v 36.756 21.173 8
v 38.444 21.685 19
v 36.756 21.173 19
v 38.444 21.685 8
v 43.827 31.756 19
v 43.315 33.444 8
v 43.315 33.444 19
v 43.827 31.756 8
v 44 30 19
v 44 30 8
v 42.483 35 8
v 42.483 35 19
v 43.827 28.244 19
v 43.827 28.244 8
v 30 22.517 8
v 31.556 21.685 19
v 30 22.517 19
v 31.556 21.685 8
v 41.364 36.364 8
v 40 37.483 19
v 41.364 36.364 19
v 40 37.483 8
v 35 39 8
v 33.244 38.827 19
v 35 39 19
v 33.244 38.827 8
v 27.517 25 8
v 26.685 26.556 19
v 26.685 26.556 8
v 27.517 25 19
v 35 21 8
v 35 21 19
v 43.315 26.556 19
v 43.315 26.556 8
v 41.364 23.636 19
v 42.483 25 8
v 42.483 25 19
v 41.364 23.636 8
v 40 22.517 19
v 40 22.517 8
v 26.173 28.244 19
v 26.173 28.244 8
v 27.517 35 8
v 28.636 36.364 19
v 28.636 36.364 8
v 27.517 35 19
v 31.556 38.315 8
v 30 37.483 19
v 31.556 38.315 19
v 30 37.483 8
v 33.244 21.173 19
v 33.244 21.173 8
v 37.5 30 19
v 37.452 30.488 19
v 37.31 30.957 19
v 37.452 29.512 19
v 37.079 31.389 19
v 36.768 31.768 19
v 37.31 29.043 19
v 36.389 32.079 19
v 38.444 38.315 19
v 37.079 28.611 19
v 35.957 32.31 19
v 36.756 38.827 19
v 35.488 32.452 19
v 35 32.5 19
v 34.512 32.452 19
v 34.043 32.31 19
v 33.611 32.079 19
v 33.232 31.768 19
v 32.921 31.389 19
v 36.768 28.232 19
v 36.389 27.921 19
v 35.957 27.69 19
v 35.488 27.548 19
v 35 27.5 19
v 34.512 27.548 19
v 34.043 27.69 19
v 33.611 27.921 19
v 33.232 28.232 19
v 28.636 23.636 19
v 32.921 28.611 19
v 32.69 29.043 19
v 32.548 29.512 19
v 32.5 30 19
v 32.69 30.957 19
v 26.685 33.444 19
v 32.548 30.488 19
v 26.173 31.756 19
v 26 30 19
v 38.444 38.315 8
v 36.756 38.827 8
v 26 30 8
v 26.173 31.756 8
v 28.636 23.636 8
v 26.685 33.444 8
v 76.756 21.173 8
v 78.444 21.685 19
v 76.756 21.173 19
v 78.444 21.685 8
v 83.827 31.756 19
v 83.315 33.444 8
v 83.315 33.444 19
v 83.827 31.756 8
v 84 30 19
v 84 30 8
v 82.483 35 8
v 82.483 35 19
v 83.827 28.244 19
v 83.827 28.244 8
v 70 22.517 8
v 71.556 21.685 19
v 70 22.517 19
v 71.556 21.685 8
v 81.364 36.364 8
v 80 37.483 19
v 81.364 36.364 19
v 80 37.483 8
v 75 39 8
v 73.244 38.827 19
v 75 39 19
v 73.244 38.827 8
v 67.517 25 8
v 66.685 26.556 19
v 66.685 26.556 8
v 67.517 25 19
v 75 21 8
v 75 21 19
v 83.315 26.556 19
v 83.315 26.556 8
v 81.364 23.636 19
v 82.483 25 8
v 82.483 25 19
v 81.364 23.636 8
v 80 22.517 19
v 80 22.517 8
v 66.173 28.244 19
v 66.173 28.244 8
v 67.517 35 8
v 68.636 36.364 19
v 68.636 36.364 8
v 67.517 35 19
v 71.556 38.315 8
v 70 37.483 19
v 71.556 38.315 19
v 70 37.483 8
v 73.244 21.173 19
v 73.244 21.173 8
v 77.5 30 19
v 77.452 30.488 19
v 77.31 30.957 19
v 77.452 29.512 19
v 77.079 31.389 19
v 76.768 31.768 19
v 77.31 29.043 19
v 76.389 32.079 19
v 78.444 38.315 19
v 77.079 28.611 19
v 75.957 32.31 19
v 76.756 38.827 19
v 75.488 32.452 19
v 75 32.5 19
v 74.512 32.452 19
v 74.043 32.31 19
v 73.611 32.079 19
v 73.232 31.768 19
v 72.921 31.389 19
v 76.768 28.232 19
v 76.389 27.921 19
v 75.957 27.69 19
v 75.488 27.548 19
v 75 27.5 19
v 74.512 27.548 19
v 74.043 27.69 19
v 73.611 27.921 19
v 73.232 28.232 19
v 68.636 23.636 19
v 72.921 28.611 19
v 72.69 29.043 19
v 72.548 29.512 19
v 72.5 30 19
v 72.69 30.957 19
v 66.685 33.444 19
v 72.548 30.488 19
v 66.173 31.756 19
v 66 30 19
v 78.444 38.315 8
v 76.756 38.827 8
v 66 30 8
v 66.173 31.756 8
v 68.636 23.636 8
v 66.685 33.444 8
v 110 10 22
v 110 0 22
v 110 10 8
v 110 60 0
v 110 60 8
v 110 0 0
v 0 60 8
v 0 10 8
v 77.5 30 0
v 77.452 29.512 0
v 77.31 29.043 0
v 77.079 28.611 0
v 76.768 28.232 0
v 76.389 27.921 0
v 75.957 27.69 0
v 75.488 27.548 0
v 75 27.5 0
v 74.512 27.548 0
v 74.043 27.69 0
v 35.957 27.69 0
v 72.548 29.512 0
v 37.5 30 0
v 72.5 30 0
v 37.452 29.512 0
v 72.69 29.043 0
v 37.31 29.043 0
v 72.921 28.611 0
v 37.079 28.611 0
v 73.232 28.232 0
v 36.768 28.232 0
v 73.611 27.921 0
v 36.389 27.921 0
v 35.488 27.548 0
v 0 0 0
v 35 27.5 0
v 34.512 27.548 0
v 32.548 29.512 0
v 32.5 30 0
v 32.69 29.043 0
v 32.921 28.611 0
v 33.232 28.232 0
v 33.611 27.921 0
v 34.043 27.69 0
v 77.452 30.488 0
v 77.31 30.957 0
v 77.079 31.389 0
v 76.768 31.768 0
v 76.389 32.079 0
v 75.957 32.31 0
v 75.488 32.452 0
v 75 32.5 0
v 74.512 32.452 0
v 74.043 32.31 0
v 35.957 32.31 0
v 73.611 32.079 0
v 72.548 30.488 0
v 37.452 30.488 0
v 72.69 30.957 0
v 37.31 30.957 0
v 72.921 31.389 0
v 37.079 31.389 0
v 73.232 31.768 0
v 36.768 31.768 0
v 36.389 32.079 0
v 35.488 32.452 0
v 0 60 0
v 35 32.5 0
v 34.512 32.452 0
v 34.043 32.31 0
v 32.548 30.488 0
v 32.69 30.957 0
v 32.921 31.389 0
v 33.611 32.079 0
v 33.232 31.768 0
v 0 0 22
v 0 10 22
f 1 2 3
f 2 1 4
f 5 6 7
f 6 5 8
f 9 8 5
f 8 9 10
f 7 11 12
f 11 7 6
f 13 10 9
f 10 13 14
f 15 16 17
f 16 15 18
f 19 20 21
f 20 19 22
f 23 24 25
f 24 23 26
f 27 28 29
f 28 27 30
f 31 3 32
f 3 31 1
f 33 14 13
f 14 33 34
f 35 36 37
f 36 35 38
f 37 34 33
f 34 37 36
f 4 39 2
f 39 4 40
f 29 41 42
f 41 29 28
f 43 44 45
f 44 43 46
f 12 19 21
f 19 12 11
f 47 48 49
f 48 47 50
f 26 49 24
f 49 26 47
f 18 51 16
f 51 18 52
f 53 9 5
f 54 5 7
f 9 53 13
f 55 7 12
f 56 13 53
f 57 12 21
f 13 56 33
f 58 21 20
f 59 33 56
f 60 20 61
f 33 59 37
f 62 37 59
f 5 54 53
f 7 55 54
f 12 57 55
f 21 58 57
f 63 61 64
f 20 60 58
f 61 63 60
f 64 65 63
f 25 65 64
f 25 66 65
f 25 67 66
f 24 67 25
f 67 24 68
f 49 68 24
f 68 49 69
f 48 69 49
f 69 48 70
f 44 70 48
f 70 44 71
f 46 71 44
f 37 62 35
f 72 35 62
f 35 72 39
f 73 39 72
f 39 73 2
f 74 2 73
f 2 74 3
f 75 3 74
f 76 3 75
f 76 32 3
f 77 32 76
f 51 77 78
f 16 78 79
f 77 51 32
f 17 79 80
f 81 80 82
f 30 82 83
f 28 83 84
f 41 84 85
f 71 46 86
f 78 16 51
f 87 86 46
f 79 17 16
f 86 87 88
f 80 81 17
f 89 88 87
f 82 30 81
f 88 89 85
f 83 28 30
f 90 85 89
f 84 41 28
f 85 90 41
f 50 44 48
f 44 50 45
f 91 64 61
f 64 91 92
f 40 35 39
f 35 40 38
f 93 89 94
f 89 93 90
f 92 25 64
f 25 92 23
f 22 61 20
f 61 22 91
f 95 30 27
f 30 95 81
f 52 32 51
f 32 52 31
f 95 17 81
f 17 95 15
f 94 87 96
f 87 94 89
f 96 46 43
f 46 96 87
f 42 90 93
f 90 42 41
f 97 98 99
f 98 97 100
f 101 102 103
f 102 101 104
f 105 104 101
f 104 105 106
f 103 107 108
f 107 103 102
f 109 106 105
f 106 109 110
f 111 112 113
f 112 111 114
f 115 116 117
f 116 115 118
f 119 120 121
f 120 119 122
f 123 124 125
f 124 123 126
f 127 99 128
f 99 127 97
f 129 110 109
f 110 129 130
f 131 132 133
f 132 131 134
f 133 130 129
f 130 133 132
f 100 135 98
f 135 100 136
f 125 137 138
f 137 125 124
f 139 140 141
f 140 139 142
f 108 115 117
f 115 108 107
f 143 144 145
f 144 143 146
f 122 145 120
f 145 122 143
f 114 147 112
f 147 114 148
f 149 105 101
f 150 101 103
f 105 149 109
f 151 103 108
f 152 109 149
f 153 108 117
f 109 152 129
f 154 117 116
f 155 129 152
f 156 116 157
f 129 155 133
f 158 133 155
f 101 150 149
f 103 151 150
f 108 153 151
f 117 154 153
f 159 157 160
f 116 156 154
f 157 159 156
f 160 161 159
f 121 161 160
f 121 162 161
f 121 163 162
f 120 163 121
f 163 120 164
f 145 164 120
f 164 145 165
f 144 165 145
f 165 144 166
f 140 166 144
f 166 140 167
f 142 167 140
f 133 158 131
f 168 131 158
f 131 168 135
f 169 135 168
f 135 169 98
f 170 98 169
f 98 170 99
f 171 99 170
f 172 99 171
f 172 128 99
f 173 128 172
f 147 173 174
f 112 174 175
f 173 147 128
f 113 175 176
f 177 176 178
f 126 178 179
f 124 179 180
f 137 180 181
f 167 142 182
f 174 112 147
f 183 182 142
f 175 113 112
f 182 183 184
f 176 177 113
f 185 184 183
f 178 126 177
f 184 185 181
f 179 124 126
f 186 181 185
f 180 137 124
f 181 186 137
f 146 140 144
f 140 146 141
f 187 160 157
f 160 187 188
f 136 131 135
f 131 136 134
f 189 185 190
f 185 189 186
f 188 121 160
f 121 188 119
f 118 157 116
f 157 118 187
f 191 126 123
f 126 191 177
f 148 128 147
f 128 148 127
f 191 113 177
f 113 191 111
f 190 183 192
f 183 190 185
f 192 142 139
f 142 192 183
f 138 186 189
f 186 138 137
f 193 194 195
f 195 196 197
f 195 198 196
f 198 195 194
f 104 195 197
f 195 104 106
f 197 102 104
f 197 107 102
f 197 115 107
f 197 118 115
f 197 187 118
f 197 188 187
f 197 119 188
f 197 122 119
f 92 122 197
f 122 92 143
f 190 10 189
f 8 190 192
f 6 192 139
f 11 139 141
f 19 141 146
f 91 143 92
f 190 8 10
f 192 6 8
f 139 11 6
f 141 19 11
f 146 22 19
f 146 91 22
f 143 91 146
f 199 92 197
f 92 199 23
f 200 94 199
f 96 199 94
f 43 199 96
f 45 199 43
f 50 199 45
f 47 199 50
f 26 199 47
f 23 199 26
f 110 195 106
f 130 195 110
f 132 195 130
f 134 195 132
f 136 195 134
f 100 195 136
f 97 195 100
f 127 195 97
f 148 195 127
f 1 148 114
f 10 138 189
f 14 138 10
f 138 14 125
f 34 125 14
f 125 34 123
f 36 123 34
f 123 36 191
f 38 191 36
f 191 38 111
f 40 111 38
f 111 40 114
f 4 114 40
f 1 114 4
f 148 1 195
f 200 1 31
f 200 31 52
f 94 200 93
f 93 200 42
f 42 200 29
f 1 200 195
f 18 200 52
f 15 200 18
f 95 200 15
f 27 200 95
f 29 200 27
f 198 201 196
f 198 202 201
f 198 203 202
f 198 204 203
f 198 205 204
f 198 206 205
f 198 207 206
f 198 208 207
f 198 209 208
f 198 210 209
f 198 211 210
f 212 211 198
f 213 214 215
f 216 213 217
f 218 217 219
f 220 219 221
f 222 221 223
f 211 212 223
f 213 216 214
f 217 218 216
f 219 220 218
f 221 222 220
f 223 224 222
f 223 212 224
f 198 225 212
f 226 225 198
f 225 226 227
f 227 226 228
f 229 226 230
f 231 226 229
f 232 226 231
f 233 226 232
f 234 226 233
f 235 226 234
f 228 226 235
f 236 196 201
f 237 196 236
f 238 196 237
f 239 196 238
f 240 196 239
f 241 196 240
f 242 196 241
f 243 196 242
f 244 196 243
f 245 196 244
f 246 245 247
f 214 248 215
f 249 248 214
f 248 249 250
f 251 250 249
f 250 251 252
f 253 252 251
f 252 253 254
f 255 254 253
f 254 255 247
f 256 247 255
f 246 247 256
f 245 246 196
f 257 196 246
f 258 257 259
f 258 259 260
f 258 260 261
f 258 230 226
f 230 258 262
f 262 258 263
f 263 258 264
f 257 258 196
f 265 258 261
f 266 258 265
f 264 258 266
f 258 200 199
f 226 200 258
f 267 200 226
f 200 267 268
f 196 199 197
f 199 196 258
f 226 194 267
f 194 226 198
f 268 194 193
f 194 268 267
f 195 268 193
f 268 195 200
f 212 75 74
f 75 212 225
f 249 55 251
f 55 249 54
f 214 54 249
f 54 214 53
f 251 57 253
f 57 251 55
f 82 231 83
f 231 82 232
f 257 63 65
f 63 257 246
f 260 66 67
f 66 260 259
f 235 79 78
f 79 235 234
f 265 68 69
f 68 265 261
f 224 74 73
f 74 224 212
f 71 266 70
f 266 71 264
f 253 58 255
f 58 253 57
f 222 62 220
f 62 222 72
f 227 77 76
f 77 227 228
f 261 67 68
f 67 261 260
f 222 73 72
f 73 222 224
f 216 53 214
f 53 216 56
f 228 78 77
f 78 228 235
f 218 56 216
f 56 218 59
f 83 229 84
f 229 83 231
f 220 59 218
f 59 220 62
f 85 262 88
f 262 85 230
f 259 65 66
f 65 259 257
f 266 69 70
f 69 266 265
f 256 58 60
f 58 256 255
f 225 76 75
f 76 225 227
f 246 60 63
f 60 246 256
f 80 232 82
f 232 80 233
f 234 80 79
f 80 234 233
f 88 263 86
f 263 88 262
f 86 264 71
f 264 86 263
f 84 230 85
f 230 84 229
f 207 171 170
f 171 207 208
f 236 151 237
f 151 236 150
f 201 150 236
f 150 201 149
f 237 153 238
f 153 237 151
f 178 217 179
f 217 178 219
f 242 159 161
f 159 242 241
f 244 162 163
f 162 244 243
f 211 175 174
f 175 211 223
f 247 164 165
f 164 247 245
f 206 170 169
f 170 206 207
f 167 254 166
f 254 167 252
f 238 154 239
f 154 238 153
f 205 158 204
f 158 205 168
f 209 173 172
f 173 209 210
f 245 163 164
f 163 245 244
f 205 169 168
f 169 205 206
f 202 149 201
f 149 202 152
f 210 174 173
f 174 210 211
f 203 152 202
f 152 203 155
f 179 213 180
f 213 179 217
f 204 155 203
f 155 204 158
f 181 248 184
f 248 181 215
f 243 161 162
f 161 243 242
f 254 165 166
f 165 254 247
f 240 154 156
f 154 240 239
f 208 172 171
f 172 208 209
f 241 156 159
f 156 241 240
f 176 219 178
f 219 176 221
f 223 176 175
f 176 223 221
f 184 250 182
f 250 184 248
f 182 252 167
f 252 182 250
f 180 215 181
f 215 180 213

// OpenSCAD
$fn = 32;

// ----------------------------------------------------------------------
// Drill jig: fence jig
// ----------------------------------------------------------------------

// --- parameters (mm) ---
plate_l = 110;            // plate length, X
plate_w = 60;             // plate width, Y
plate_t = 8;              // plate thickness
boss_d = 18;              // guide boss diameter
boss_h = 12;              // boss height above the plate
guide_d = 5;              // guide hole diameter
boss_pitch = 40;          // boss pitch
fence_h = 15;             // fence height above the plate
fence_t = 10;             // fence thickness

n_boss = 2;  // guide bosses
boss_x0 = (plate_l - (n_boss - 1) * boss_pitch) / 2;  // first boss X
boss_top = plate_t - 1 + boss_h;  // boss crown height
fence_top = plate_t - 1 + fence_h;  // fence crown height
total_h = max([fence_top, boss_top]);  // overall height

difference() {
  union() {
  cube([plate_l, plate_w, plate_t]);
  for (i = [0 : n_boss - 1])
    translate([boss_x0 + i * boss_pitch, plate_w / 2, plate_t - 1])
      cylinder(h = boss_h, d = boss_d);
  translate([0, 0, plate_t - 1]) cube([plate_l, fence_t, fence_h]);
  }
  for (i = [0 : n_boss - 1])
    translate([boss_x0 + i * boss_pitch, plate_w / 2, -1])
      cylinder(h = plate_t + boss_h, d = guide_d);
}
